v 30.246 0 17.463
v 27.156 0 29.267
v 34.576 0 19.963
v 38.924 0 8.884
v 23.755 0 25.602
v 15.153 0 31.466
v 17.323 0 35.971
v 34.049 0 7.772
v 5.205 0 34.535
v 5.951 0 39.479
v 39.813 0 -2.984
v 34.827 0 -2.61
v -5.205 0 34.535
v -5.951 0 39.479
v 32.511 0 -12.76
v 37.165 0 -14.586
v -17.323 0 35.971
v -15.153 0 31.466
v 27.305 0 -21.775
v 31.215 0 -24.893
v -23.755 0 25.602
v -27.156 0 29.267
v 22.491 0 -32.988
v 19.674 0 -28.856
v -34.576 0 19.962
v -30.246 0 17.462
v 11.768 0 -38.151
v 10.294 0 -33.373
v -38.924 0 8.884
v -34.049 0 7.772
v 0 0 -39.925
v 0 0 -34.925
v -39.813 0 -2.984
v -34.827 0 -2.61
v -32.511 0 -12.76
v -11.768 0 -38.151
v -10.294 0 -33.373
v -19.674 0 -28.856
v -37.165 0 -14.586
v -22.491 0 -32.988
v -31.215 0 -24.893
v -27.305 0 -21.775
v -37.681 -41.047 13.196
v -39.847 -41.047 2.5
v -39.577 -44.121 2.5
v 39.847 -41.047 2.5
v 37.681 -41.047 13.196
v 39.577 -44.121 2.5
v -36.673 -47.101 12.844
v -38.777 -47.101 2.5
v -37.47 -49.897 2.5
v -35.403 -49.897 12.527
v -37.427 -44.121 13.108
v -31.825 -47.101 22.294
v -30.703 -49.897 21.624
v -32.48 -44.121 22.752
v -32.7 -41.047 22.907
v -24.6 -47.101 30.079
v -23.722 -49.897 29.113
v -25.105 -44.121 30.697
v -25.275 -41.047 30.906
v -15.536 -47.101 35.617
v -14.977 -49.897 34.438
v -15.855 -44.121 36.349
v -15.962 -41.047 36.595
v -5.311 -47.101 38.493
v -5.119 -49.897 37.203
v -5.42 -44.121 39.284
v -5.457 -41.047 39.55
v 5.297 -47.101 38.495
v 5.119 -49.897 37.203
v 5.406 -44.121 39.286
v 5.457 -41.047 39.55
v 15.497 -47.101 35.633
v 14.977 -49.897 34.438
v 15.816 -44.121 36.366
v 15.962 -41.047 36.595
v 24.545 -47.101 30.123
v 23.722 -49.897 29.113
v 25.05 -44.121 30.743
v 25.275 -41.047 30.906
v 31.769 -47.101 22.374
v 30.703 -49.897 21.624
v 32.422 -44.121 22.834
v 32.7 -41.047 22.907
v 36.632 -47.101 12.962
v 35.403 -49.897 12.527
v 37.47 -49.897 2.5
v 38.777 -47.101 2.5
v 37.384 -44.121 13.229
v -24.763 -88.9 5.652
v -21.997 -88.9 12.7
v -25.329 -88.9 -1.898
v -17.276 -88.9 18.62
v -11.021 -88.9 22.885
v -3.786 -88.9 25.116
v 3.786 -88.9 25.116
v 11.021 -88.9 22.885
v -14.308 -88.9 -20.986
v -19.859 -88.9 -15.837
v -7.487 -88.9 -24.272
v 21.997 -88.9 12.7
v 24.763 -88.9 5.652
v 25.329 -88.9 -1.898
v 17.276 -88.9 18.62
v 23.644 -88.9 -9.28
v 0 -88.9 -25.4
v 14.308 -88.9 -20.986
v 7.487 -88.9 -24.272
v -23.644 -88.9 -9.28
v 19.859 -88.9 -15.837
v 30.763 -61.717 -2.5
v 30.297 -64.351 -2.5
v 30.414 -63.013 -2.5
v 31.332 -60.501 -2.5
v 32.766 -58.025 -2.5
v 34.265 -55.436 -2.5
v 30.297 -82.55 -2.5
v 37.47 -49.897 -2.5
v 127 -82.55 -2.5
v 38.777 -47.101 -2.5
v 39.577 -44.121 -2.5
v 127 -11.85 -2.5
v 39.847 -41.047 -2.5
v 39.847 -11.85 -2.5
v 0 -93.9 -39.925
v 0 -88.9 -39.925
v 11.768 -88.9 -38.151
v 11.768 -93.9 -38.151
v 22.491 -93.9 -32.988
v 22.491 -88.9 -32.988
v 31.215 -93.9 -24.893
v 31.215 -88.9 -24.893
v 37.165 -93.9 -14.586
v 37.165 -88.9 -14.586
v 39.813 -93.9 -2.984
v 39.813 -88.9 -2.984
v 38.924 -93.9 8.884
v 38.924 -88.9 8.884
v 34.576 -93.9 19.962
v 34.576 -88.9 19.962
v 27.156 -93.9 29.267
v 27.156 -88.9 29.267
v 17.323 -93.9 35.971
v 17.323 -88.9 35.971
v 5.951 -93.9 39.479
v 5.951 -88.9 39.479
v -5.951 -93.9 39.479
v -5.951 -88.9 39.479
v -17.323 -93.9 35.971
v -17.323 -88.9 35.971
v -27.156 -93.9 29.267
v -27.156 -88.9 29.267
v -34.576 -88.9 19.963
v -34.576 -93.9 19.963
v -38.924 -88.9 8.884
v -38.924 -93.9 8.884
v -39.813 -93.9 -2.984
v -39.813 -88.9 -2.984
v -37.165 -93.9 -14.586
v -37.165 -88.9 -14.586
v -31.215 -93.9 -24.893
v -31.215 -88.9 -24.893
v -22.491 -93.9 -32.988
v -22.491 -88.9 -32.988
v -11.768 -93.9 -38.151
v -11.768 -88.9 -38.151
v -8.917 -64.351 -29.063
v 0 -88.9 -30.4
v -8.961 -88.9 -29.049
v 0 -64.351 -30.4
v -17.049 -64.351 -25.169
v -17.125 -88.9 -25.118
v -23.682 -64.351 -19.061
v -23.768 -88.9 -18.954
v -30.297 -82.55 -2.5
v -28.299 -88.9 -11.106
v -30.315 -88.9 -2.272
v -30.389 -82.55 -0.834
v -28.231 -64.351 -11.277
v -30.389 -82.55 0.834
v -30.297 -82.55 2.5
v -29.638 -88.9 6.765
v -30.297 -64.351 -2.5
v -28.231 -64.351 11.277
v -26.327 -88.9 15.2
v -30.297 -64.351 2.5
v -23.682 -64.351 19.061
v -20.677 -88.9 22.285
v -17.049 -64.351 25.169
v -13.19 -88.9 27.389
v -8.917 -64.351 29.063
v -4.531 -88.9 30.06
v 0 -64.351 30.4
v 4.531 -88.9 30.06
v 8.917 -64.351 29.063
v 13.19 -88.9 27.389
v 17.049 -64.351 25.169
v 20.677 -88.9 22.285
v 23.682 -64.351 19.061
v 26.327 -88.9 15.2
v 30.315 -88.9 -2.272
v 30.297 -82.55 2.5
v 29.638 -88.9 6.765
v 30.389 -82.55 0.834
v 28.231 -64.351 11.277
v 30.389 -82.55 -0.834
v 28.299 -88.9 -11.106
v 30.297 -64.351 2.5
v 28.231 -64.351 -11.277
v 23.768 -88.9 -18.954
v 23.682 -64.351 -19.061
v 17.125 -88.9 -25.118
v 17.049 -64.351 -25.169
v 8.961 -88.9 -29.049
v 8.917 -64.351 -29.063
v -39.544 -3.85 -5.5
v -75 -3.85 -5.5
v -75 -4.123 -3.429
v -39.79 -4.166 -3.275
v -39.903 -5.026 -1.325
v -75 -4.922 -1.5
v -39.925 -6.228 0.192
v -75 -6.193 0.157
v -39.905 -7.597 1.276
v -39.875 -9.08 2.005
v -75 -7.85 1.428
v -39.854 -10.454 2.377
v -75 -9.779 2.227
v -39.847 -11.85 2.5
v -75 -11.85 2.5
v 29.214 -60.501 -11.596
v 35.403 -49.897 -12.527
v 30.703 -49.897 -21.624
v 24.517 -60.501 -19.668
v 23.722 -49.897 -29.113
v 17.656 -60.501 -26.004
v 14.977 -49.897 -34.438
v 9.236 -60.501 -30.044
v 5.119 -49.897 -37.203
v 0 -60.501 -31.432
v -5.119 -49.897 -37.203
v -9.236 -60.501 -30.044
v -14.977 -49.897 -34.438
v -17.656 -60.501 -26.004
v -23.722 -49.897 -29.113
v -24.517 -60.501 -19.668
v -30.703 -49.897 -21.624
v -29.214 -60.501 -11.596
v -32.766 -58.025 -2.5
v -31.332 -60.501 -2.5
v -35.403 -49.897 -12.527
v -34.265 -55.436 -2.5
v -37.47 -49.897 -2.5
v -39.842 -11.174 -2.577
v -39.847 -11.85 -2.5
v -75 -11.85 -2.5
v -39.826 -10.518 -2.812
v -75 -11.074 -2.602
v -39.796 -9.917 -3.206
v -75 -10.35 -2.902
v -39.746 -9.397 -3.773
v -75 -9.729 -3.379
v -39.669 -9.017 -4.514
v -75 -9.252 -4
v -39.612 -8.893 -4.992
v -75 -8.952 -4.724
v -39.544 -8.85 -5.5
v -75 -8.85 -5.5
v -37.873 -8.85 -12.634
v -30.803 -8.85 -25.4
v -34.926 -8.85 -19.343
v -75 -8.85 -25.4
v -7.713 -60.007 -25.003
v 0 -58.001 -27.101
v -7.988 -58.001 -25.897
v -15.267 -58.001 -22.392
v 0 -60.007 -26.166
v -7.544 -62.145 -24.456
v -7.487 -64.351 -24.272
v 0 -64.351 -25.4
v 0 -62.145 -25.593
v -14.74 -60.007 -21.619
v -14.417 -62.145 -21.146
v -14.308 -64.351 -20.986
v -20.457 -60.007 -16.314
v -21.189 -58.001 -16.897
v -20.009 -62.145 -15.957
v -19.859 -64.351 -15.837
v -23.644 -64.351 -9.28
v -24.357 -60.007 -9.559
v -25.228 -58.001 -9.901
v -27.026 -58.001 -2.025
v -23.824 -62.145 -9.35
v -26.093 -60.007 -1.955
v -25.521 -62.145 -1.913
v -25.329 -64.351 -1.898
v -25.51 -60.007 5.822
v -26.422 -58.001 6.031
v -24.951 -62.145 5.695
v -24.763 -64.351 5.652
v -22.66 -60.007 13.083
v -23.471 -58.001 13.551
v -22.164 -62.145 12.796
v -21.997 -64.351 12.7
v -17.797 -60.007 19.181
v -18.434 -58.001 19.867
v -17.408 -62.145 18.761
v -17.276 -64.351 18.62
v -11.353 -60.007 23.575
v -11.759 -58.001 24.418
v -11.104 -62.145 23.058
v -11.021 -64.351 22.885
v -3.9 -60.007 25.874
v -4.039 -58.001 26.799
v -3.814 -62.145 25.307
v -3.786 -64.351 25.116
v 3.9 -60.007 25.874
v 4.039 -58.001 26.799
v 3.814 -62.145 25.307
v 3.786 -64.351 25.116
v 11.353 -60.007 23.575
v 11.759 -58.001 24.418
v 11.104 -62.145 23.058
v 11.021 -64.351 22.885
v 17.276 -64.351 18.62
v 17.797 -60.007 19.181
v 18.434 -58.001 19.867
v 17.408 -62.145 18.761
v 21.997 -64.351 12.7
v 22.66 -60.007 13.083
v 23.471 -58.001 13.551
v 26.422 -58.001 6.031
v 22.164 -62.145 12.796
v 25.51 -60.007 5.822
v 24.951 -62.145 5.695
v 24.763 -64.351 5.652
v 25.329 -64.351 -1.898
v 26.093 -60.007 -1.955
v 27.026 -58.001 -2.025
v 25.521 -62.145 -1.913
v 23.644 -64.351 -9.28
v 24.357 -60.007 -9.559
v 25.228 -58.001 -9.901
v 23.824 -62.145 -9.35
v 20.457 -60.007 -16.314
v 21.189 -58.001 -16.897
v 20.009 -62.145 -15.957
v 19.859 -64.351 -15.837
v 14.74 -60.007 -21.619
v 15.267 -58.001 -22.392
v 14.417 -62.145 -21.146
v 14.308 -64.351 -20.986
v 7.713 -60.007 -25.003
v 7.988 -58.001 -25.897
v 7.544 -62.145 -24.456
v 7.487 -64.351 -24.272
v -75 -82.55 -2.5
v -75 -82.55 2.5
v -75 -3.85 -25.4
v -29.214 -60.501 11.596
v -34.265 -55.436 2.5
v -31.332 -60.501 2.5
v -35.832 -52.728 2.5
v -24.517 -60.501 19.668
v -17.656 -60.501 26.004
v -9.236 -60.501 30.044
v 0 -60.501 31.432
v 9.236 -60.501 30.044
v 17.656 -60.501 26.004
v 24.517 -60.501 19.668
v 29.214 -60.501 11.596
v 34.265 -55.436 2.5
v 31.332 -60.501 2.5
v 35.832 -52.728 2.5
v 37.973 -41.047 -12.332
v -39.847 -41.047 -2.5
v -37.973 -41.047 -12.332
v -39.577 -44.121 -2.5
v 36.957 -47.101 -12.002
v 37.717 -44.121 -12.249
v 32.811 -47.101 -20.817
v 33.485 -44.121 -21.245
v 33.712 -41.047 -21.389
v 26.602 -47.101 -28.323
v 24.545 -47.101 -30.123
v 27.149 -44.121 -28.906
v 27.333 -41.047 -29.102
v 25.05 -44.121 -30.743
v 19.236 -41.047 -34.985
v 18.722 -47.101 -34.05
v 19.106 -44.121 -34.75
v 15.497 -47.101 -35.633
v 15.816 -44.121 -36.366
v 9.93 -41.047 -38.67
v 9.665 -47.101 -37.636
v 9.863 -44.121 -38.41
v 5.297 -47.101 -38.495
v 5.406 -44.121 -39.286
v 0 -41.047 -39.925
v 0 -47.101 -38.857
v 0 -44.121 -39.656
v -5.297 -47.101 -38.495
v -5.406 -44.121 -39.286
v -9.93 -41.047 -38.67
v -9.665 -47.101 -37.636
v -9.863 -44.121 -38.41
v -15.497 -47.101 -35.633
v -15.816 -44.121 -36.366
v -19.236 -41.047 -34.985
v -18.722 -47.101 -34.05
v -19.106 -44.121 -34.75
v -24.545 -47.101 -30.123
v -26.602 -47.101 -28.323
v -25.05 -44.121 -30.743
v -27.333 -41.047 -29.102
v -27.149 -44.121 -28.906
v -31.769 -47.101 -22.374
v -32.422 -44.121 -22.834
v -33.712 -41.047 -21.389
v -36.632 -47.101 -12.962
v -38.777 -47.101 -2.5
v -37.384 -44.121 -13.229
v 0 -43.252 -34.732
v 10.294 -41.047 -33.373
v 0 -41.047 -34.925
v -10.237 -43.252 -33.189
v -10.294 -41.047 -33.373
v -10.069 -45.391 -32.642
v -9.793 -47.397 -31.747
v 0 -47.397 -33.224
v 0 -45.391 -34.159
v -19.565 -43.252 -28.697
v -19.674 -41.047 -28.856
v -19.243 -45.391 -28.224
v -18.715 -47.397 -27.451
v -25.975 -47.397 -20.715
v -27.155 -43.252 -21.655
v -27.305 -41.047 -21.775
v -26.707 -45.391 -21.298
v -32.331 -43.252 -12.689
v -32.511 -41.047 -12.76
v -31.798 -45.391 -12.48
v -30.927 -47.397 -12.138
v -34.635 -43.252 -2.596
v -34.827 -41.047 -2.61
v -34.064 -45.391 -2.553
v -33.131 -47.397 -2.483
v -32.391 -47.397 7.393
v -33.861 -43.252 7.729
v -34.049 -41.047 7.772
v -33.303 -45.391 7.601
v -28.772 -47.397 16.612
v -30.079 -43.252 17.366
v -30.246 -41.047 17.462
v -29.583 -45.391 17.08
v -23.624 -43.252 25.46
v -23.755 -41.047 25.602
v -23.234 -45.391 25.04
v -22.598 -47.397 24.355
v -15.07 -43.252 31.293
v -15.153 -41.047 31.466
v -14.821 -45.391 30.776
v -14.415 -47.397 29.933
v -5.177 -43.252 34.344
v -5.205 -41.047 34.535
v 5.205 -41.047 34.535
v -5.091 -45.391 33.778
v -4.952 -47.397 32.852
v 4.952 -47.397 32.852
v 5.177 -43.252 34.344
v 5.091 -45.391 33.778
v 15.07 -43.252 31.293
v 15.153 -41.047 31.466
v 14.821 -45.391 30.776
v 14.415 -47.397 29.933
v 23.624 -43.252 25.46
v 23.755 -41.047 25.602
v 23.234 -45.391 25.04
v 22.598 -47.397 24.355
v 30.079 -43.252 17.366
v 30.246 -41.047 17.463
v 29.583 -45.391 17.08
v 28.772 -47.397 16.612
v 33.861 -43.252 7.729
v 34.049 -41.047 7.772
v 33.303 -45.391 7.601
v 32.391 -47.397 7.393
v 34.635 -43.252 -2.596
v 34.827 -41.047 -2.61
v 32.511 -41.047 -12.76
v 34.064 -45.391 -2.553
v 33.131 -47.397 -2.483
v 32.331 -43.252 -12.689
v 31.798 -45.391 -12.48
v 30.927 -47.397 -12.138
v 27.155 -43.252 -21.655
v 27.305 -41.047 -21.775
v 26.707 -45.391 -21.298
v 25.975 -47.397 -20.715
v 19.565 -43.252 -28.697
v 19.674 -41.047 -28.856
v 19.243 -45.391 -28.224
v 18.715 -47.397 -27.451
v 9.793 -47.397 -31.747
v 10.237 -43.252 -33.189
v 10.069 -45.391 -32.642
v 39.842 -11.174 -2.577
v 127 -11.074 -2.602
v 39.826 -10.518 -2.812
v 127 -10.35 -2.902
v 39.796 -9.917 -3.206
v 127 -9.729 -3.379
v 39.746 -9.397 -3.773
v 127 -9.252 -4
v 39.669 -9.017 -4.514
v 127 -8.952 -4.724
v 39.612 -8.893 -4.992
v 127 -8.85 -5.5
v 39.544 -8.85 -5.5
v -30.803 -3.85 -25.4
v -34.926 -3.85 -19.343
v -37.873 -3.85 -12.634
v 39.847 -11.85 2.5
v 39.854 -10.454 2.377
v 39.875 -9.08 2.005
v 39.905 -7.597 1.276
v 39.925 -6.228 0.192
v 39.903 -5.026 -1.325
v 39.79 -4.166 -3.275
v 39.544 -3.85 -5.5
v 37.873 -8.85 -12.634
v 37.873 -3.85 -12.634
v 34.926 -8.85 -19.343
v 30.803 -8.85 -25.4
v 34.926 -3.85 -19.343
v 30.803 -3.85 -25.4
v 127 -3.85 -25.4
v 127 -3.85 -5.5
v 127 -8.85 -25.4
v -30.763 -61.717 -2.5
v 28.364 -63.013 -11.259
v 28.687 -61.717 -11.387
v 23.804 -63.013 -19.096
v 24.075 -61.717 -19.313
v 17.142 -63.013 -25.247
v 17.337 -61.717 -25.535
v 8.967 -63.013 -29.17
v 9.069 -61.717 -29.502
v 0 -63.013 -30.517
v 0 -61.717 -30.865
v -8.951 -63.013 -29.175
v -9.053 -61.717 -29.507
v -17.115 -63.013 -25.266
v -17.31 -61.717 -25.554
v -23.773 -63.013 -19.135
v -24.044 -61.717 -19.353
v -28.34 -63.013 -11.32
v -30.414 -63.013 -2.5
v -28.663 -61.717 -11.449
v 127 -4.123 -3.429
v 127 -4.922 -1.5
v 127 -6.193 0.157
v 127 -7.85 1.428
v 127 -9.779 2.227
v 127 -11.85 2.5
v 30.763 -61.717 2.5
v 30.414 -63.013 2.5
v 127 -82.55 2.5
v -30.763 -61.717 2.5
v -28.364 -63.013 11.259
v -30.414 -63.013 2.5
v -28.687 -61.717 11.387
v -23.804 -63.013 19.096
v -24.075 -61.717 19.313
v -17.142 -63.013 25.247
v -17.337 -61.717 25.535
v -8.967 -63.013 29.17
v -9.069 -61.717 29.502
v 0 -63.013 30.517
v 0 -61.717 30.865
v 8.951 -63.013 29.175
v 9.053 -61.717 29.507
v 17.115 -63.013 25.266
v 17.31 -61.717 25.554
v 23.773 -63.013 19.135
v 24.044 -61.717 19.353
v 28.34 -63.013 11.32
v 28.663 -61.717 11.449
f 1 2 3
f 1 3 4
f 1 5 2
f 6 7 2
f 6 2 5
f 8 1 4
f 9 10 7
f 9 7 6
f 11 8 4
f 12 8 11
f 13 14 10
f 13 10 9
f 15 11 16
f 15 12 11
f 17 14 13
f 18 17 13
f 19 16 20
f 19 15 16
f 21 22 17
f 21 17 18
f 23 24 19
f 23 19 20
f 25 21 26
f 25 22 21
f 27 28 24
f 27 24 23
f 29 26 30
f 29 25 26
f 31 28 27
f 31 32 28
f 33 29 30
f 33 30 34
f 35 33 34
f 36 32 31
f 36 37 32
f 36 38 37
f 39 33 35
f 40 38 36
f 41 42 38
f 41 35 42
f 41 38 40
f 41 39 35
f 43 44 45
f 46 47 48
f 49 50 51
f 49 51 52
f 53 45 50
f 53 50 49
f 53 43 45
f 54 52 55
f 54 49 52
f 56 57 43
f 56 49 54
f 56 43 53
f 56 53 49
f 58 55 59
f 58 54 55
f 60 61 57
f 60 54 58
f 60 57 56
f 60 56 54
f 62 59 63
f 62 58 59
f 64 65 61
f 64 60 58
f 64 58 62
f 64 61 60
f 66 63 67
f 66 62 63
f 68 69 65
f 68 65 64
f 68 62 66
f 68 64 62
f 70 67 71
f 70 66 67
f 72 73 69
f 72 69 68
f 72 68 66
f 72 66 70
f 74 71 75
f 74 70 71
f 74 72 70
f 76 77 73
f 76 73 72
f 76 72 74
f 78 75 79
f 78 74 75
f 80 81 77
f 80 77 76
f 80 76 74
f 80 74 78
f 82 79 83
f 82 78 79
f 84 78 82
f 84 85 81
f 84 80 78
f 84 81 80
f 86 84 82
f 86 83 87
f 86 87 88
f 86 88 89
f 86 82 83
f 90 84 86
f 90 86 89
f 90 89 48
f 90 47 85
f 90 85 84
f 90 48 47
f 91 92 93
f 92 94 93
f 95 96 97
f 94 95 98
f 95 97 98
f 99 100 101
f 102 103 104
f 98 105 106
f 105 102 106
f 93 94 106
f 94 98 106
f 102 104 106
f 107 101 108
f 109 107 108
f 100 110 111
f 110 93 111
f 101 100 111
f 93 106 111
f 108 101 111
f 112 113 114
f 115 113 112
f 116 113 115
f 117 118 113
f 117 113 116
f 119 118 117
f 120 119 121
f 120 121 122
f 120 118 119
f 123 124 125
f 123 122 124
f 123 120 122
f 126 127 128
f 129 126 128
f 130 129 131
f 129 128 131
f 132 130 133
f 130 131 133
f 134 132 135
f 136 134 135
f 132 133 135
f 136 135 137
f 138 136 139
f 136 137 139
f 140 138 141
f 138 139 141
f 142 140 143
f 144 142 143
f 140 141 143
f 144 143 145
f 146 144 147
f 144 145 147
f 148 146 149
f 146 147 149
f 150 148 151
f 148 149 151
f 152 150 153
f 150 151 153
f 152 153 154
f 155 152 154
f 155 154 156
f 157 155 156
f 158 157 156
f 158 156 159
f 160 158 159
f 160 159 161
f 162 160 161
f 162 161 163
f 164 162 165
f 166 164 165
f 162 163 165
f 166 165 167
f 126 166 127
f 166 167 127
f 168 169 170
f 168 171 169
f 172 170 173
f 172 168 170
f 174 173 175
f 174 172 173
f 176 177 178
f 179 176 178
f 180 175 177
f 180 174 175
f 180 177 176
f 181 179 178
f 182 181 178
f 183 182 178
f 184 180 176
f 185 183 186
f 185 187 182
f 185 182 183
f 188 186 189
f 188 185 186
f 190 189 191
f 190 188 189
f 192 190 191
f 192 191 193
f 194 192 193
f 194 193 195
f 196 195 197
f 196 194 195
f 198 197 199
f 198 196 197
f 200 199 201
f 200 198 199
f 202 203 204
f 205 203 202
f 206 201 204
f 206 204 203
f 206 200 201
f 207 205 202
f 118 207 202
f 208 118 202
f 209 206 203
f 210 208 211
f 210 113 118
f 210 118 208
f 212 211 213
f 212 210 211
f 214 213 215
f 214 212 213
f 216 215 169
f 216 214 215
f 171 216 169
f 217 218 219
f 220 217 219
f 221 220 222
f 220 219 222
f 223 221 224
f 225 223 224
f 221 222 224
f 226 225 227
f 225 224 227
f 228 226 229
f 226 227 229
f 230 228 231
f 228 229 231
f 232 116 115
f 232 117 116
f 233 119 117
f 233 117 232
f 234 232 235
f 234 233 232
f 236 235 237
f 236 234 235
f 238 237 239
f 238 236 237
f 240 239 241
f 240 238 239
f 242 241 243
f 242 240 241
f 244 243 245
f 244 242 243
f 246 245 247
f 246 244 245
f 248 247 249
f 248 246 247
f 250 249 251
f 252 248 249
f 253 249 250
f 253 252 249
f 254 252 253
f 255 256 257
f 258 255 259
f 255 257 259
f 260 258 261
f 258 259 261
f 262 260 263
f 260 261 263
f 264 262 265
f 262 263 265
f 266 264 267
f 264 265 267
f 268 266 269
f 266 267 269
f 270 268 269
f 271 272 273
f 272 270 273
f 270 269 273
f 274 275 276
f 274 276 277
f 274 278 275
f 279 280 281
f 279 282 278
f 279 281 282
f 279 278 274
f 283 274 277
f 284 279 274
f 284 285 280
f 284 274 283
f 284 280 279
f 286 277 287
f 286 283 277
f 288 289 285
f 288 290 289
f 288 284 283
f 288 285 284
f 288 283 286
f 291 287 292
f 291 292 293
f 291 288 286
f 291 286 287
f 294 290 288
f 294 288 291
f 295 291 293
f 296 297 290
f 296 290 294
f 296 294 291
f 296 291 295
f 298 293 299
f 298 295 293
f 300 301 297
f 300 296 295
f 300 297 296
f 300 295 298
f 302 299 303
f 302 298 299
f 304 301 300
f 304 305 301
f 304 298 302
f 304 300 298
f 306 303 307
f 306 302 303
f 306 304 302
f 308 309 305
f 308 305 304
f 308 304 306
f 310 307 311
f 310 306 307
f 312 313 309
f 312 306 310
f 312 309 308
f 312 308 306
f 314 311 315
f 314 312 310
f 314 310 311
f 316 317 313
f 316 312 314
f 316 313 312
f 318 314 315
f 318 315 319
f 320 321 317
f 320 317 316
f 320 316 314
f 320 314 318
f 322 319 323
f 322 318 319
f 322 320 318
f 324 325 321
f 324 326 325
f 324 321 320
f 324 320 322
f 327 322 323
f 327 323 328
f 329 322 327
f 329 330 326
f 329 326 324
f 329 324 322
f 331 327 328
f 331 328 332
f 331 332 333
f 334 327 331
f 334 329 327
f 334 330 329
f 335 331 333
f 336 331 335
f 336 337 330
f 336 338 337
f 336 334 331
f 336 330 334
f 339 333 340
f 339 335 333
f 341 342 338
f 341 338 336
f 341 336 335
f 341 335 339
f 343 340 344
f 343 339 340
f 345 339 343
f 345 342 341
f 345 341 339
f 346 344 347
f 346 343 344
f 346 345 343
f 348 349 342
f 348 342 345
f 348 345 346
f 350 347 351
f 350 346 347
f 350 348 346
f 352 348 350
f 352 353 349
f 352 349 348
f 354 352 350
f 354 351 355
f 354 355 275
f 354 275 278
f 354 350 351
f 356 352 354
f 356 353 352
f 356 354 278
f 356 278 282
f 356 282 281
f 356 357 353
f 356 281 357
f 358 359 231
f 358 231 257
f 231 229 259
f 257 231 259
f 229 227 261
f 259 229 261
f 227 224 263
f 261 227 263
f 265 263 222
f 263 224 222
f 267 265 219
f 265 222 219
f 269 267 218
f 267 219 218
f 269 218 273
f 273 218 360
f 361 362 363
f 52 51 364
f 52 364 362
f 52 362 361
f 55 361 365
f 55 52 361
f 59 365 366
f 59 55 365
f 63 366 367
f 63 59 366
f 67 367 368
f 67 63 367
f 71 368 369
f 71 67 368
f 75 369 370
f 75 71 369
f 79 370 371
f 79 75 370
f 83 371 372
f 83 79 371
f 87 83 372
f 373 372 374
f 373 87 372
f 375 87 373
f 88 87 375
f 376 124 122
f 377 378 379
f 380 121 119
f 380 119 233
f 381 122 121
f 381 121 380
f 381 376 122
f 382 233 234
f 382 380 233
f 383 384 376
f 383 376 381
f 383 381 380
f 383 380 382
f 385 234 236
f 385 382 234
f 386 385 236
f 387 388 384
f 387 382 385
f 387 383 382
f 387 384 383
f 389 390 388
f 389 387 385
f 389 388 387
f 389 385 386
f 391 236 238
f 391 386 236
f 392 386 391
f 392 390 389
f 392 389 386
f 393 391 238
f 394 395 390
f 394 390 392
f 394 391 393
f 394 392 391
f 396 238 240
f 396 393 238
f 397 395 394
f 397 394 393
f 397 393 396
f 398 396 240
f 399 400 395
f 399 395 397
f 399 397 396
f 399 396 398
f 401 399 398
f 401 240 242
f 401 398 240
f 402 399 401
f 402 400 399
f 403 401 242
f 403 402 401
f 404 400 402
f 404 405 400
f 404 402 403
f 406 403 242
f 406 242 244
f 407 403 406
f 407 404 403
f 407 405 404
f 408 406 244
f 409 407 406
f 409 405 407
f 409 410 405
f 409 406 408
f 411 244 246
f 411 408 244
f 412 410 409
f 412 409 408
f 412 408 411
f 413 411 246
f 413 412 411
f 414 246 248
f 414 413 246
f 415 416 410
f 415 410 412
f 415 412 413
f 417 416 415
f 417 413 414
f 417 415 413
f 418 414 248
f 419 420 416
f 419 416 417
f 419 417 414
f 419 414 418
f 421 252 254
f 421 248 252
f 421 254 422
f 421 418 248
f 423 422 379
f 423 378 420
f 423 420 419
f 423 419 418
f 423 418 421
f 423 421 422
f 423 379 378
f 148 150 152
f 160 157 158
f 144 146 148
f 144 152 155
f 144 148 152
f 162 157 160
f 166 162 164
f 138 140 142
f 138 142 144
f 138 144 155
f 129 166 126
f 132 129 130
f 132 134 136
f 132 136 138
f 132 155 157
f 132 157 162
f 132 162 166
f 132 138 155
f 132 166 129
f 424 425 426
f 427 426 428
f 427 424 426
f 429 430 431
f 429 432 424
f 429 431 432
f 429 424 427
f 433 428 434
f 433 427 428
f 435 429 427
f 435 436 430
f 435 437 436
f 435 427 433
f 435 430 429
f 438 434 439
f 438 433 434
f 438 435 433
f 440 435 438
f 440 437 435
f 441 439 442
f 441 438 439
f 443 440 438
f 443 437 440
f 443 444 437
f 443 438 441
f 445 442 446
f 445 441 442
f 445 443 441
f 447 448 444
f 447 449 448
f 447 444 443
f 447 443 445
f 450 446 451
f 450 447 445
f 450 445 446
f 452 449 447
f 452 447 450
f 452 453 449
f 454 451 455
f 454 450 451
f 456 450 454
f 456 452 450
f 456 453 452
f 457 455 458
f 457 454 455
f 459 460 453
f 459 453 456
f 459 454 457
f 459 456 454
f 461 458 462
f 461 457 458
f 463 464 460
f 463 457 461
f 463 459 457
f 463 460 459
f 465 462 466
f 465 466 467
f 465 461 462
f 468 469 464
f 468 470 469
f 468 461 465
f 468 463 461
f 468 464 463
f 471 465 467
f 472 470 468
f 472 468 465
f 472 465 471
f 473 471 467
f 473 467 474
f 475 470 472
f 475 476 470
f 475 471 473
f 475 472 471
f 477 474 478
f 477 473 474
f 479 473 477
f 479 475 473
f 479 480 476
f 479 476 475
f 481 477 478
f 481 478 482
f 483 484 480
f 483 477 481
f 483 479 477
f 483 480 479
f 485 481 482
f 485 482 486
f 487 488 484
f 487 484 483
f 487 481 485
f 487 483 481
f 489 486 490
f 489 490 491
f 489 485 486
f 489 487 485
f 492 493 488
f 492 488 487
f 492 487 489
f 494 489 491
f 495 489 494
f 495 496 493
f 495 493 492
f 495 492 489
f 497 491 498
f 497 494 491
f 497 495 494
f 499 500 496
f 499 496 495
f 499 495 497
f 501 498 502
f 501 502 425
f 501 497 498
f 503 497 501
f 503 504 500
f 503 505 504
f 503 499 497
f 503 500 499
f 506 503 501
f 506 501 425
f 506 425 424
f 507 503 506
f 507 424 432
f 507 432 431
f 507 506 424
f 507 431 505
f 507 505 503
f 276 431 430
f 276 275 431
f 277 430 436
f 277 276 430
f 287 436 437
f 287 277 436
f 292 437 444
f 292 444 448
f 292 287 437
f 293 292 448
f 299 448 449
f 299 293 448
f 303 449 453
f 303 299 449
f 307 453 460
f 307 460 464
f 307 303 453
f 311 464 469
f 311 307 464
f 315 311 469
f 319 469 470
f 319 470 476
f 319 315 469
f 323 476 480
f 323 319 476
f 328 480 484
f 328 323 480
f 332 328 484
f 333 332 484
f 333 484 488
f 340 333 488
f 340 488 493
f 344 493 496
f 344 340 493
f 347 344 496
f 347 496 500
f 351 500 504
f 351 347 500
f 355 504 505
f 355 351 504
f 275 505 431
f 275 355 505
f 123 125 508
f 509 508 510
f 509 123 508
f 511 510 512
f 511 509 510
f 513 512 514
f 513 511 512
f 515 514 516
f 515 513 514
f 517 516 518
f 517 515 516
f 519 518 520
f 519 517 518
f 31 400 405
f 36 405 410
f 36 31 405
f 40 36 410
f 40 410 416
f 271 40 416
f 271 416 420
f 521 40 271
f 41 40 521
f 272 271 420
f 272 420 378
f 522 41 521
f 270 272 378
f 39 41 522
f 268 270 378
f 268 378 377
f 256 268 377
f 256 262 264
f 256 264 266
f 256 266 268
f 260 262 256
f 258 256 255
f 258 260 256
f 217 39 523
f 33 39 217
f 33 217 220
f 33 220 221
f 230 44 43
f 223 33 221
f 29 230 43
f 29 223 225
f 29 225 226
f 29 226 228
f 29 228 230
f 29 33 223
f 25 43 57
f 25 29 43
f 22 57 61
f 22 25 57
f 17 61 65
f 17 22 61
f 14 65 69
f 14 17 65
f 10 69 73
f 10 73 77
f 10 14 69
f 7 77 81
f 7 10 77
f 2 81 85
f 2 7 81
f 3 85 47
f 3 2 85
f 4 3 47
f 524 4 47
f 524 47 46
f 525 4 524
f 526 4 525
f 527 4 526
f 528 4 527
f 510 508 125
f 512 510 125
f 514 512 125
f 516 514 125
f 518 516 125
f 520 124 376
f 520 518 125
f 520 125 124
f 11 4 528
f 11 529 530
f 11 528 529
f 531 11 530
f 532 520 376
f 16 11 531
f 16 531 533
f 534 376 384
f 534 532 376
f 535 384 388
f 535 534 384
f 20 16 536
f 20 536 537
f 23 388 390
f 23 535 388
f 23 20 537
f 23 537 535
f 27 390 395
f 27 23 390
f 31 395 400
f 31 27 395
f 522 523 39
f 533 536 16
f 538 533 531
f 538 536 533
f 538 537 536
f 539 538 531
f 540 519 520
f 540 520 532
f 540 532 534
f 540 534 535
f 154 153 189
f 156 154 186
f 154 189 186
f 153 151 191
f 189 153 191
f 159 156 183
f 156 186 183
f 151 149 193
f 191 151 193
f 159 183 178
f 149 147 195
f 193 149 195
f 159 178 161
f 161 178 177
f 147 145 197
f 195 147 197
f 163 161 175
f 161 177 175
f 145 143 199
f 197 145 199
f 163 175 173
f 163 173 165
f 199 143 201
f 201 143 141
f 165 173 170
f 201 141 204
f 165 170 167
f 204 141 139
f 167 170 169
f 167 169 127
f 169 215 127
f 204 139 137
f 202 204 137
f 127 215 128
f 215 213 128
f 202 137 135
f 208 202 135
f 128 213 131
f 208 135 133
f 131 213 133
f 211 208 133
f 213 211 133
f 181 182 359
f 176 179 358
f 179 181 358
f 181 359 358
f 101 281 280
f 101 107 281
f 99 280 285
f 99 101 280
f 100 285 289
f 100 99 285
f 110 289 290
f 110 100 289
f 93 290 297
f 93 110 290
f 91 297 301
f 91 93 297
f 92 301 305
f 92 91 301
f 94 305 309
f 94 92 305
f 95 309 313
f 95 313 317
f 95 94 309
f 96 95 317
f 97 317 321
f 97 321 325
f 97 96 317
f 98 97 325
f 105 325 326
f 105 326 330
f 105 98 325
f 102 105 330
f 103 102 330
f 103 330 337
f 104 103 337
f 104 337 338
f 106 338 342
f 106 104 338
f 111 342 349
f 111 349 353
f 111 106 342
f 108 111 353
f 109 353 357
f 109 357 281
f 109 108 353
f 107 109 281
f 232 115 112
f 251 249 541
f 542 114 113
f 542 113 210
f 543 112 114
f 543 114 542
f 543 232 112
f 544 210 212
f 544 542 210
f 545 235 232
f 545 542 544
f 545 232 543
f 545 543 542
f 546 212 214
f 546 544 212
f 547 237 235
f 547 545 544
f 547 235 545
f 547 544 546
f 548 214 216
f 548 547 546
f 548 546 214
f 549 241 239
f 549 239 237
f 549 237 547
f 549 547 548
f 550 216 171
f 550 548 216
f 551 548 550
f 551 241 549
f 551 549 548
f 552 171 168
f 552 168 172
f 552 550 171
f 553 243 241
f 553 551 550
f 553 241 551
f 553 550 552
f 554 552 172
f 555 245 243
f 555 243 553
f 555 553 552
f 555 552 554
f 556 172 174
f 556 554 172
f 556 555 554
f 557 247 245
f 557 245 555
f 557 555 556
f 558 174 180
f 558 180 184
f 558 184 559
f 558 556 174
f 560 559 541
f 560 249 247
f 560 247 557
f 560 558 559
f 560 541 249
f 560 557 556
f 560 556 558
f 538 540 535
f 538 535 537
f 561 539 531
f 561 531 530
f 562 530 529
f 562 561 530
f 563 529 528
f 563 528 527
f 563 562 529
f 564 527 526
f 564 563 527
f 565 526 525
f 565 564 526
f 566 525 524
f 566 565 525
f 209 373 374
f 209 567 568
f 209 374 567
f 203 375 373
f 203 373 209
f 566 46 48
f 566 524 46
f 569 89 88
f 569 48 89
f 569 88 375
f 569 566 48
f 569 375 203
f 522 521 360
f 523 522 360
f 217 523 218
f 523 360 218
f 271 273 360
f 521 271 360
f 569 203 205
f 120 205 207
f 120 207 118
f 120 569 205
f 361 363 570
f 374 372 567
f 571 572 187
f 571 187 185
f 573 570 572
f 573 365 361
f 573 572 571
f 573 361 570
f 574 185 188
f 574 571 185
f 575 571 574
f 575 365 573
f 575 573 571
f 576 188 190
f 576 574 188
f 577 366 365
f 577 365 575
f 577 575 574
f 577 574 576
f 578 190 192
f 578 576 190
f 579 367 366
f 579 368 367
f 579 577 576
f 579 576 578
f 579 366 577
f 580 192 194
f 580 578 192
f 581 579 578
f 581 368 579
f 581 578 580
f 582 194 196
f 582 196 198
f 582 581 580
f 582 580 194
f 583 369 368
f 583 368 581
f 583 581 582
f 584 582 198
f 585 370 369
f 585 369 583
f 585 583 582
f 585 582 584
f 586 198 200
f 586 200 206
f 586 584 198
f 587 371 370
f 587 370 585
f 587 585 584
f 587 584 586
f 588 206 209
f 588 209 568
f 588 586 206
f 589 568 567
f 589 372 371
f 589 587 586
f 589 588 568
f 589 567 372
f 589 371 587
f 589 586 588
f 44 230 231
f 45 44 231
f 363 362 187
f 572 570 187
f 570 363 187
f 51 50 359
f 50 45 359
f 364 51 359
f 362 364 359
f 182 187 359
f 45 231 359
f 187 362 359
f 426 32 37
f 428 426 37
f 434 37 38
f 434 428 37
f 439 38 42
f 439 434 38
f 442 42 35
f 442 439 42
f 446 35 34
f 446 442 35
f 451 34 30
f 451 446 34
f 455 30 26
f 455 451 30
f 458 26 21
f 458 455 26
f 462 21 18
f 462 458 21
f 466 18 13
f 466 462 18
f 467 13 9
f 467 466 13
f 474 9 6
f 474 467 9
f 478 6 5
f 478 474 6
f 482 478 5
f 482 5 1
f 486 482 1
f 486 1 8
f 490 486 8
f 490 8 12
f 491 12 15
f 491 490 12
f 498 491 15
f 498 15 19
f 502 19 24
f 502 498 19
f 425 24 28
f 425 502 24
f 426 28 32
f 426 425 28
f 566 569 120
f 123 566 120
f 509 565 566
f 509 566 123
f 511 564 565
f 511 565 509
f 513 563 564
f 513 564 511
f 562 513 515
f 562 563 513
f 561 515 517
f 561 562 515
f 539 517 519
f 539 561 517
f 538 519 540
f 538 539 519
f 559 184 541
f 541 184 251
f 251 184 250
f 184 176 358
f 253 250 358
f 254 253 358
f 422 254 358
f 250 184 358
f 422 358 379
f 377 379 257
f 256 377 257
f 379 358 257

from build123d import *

# Parameters (mm, degrees)
EXTRUDE_1_REACH   = 195.29
SKETCH_3_R        = 39.925
EXTRUDE_1_2_DEPTH = 5
EXTRUDE_3_REACH   = 228.308


with BuildPart() as part:
    # strainer → 旋轉-薄件1 (revolve)
    with BuildSketch(Plane.XY, mode=Mode.PRIVATE) as revolve_1_sk:
        with BuildLine():
            Line((-34.925, 0), (-34.925, -41.047045184))
            ThreePointArc((-34.925, -41.047045184), (-34.492257994, -44.334047057), (-33.223522628, -47.397045184))
            Line((-33.223522628, -47.397045184), (-27.101477372, -58.000738614))
            ThreePointArc((-27.101477372, -58.000738614), (-25.832742006, -61.063736741), (-25.4, -64.350738614))
            Line((-25.4, -64.350738614), (-25.4, -88.9))
            Line((-25.4, -88.9), (-30.4, -88.9))
            Line((-30.4, -88.9), (-30.4, -64.350738614))
            ThreePointArc((-30.4, -64.350738614), (-30.662371138, -62.357831967), (-31.431604391, -60.500738614))
            Line((-31.431604391, -60.500738614), (-37.553649647, -49.897045184))
            ThreePointArc((-37.553649647, -49.897045184), (-39.321887125, -45.628142282), (-39.925, -41.047045184))
            Line((-39.925, -41.047045184), (-39.925, 0))
            Line((-39.925, 0), (-34.925, 0))
        make_face()
    revolve(revolve_1_sk.sketch.rotate(Axis((0, 0, 0), (0, 1, 0)), 270), axis=Axis((0, 0, 0), (0, 1, 0)))

    # bracket → Extrude 1 (add, up to next)
    with BuildSketch(Plane(origin=(127, 0, 0), x_dir=(0, 0, -1), z_dir=(1, 0, 0)), mode=Mode.PRIVATE) as extrude_1_sk1:
        with BuildLine():
            Line((25.4, -3.85), (5.5, -3.85))
            ThreePointArc((5.5, -3.85), (-0.156854249, -6.193145751), (-2.5, -11.85))
            Line((-2.5, -11.85), (-2.5, -82.55))
            Line((-2.5, -82.55), (2.5, -82.55))
            Line((2.5, -82.55), (2.5, -11.85))
            ThreePointArc((2.5, -11.85), (3.378679656, -9.728679656), (5.5, -8.85))
            Line((5.5, -8.85), (25.4, -8.85))
            Line((25.4, -8.85), (25.4, -3.85))
        make_face()
    extrude_1_tool1 = extrude(extrude_1_sk1.sketch, amount=-EXTRUDE_1_REACH, mode=Mode.PRIVATE) - part.part
    add(extrude_1_tool1.solids().sort_by_distance((127, -4.684991, -15.45))[0])

    # 草圖3 → Extrude 1 2 (add)
    with BuildSketch(Plane.XZ.offset(88.9)):
        with Locations(Location((0, 0, 0), (0, 0, 270))):
            Circle(SKETCH_3_R)
    extrude(amount=EXTRUDE_1_2_DEPTH)

    # 草圖4 → 填料-伸長3 (add, up to next)
    with BuildSketch(Plane(origin=(-75, 0, 0), x_dir=(0, 0, -1), z_dir=(1, 0, 0)), mode=Mode.PRIVATE) as extrude_3_sk1:
        with BuildLine():
            Line((5.5, -8.85), (25.4, -8.85))
            Line((25.4, -8.85), (25.4, -3.85))
            Line((25.4, -3.85), (5.5, -3.85))
            ThreePointArc((5.5, -3.85), (-0.156854249, -6.193145751), (-2.5, -11.85))
            Line((-2.5, -11.85), (-2.5, -82.55))
            Line((-2.5, -82.55), (2.5, -82.55))
            Line((2.5, -82.55), (2.5, -11.85))
            ThreePointArc((2.5, -11.85), (3.378679656, -9.728679656), (5.5, -8.85))
        make_face()
    extrude_3_tool1 = extrude(extrude_3_sk1.sketch, amount=EXTRUDE_3_REACH, mode=Mode.PRIVATE) - part.part
    add(extrude_3_tool1.solids().sort_by_distance((-75, -9.138252, -2.788252))[0])


solid = part.part
